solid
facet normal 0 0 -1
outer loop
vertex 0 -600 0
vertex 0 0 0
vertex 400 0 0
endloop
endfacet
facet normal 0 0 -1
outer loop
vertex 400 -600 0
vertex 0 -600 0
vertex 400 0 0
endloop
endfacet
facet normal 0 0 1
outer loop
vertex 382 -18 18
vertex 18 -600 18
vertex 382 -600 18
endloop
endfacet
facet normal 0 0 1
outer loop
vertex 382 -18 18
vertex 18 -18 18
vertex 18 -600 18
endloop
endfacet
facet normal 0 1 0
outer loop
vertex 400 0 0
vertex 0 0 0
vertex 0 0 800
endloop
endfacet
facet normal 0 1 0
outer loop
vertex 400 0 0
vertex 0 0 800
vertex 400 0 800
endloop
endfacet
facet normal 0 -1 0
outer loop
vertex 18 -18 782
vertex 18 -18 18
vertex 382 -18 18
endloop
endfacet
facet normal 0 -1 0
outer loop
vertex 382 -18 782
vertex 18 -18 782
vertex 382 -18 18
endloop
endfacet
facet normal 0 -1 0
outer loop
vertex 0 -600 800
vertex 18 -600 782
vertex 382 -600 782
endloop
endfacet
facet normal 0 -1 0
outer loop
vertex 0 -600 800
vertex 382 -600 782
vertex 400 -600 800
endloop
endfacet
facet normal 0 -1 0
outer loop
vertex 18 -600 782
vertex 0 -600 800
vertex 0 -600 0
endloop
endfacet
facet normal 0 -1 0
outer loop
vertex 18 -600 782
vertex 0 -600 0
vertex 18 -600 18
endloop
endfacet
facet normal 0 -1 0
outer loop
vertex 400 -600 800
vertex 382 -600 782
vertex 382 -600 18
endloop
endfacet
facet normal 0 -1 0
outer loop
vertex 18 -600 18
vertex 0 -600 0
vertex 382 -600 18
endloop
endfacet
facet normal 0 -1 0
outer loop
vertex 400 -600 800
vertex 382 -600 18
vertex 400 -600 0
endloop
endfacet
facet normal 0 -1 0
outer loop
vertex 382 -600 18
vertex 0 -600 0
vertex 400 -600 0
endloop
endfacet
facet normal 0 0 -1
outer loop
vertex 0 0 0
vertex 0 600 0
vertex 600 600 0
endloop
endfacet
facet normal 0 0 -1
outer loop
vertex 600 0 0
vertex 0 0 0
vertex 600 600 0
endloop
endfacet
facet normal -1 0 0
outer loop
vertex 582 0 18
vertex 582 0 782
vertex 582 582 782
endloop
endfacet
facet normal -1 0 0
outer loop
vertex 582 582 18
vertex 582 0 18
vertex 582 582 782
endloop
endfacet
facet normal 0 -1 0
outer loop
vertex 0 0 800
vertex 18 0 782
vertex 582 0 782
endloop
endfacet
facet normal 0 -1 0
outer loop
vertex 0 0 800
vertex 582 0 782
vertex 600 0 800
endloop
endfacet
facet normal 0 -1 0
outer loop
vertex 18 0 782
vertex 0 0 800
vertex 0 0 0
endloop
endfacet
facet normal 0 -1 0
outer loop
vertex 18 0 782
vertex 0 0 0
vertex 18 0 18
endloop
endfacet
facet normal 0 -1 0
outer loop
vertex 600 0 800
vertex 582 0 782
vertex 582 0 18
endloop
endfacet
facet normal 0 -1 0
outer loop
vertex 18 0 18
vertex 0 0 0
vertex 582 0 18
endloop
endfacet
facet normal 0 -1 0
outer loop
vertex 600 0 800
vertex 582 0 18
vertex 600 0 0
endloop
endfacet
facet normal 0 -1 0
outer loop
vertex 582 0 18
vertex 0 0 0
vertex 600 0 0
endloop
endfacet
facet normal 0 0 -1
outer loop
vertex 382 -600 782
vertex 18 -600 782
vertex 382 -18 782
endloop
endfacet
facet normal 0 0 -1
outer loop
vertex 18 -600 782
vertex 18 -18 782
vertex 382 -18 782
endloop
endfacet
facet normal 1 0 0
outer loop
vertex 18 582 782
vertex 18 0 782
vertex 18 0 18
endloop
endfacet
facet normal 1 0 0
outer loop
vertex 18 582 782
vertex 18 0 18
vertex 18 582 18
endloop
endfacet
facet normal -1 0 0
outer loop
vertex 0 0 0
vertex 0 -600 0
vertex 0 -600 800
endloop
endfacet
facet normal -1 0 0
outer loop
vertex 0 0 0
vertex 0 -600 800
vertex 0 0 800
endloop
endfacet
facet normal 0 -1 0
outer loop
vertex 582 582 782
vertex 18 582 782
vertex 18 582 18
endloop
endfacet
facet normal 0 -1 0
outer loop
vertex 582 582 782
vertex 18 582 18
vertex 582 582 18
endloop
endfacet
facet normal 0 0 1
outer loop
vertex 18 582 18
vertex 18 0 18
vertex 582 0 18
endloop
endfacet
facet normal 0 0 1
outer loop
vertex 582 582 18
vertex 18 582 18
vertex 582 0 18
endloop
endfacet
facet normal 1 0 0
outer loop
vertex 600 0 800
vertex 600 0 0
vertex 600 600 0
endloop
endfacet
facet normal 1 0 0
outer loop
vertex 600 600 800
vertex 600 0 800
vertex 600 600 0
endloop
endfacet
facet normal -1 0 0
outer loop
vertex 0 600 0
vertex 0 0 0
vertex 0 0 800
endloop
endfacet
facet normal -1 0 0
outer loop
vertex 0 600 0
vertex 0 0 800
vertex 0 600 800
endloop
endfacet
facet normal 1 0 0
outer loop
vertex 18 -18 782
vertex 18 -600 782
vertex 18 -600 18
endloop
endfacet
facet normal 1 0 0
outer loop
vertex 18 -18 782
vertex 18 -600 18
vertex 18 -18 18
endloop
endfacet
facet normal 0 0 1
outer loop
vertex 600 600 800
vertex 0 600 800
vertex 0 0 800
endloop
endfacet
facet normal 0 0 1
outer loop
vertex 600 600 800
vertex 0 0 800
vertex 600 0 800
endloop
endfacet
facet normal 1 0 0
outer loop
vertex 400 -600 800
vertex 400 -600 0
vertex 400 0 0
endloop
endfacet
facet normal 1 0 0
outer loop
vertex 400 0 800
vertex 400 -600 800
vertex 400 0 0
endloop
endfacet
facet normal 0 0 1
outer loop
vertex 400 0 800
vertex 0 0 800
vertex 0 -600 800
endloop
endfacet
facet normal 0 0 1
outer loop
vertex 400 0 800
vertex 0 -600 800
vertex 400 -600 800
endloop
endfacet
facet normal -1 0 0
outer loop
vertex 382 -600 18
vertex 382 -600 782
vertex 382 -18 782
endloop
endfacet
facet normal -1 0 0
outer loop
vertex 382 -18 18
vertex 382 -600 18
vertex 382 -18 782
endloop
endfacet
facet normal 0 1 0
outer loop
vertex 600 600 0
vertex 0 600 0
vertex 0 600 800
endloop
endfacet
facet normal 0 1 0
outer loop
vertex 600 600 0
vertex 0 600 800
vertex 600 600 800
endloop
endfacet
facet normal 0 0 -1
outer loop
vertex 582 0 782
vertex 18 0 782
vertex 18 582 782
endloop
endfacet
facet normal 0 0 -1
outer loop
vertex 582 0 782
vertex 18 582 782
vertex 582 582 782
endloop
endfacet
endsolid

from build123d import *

# Parameters (mm, degrees)
F0_W     = 600
F0_H     = 600
F1_DEPTH = 800
F2_W     = 400
F2_H     = 600
F3_DEPTH = 800
F4_T     = -18
F5_T     = -18


with BuildPart() as f1:
    # F0 (on Top) → F1 (new body)
    with BuildSketch(Plane.XY):
        with Locations((300, 300)):
            Rectangle(F0_W, F0_H)
    extrude(amount=F1_DEPTH)

    # F5
    f5_openings = [f1.faces().sort_by_distance(p)[0] for p in [
        (300, 0, 400),
    ]]
    offset(amount=F5_T, openings=f5_openings)


with BuildPart() as f3:
    # F2 (on Top) → F3 (new body)
    with BuildSketch(Plane.XY):
        with Locations((200, -300)):
            Rectangle(F2_W, F2_H)
    extrude(amount=F3_DEPTH)

    # F4
    f4_openings = [f3.faces().sort_by_distance(p)[0] for p in [
        (200, -600, 400),
    ]]
    offset(amount=F4_T, openings=f4_openings)


solid = Compound([f1.part, f3.part])
